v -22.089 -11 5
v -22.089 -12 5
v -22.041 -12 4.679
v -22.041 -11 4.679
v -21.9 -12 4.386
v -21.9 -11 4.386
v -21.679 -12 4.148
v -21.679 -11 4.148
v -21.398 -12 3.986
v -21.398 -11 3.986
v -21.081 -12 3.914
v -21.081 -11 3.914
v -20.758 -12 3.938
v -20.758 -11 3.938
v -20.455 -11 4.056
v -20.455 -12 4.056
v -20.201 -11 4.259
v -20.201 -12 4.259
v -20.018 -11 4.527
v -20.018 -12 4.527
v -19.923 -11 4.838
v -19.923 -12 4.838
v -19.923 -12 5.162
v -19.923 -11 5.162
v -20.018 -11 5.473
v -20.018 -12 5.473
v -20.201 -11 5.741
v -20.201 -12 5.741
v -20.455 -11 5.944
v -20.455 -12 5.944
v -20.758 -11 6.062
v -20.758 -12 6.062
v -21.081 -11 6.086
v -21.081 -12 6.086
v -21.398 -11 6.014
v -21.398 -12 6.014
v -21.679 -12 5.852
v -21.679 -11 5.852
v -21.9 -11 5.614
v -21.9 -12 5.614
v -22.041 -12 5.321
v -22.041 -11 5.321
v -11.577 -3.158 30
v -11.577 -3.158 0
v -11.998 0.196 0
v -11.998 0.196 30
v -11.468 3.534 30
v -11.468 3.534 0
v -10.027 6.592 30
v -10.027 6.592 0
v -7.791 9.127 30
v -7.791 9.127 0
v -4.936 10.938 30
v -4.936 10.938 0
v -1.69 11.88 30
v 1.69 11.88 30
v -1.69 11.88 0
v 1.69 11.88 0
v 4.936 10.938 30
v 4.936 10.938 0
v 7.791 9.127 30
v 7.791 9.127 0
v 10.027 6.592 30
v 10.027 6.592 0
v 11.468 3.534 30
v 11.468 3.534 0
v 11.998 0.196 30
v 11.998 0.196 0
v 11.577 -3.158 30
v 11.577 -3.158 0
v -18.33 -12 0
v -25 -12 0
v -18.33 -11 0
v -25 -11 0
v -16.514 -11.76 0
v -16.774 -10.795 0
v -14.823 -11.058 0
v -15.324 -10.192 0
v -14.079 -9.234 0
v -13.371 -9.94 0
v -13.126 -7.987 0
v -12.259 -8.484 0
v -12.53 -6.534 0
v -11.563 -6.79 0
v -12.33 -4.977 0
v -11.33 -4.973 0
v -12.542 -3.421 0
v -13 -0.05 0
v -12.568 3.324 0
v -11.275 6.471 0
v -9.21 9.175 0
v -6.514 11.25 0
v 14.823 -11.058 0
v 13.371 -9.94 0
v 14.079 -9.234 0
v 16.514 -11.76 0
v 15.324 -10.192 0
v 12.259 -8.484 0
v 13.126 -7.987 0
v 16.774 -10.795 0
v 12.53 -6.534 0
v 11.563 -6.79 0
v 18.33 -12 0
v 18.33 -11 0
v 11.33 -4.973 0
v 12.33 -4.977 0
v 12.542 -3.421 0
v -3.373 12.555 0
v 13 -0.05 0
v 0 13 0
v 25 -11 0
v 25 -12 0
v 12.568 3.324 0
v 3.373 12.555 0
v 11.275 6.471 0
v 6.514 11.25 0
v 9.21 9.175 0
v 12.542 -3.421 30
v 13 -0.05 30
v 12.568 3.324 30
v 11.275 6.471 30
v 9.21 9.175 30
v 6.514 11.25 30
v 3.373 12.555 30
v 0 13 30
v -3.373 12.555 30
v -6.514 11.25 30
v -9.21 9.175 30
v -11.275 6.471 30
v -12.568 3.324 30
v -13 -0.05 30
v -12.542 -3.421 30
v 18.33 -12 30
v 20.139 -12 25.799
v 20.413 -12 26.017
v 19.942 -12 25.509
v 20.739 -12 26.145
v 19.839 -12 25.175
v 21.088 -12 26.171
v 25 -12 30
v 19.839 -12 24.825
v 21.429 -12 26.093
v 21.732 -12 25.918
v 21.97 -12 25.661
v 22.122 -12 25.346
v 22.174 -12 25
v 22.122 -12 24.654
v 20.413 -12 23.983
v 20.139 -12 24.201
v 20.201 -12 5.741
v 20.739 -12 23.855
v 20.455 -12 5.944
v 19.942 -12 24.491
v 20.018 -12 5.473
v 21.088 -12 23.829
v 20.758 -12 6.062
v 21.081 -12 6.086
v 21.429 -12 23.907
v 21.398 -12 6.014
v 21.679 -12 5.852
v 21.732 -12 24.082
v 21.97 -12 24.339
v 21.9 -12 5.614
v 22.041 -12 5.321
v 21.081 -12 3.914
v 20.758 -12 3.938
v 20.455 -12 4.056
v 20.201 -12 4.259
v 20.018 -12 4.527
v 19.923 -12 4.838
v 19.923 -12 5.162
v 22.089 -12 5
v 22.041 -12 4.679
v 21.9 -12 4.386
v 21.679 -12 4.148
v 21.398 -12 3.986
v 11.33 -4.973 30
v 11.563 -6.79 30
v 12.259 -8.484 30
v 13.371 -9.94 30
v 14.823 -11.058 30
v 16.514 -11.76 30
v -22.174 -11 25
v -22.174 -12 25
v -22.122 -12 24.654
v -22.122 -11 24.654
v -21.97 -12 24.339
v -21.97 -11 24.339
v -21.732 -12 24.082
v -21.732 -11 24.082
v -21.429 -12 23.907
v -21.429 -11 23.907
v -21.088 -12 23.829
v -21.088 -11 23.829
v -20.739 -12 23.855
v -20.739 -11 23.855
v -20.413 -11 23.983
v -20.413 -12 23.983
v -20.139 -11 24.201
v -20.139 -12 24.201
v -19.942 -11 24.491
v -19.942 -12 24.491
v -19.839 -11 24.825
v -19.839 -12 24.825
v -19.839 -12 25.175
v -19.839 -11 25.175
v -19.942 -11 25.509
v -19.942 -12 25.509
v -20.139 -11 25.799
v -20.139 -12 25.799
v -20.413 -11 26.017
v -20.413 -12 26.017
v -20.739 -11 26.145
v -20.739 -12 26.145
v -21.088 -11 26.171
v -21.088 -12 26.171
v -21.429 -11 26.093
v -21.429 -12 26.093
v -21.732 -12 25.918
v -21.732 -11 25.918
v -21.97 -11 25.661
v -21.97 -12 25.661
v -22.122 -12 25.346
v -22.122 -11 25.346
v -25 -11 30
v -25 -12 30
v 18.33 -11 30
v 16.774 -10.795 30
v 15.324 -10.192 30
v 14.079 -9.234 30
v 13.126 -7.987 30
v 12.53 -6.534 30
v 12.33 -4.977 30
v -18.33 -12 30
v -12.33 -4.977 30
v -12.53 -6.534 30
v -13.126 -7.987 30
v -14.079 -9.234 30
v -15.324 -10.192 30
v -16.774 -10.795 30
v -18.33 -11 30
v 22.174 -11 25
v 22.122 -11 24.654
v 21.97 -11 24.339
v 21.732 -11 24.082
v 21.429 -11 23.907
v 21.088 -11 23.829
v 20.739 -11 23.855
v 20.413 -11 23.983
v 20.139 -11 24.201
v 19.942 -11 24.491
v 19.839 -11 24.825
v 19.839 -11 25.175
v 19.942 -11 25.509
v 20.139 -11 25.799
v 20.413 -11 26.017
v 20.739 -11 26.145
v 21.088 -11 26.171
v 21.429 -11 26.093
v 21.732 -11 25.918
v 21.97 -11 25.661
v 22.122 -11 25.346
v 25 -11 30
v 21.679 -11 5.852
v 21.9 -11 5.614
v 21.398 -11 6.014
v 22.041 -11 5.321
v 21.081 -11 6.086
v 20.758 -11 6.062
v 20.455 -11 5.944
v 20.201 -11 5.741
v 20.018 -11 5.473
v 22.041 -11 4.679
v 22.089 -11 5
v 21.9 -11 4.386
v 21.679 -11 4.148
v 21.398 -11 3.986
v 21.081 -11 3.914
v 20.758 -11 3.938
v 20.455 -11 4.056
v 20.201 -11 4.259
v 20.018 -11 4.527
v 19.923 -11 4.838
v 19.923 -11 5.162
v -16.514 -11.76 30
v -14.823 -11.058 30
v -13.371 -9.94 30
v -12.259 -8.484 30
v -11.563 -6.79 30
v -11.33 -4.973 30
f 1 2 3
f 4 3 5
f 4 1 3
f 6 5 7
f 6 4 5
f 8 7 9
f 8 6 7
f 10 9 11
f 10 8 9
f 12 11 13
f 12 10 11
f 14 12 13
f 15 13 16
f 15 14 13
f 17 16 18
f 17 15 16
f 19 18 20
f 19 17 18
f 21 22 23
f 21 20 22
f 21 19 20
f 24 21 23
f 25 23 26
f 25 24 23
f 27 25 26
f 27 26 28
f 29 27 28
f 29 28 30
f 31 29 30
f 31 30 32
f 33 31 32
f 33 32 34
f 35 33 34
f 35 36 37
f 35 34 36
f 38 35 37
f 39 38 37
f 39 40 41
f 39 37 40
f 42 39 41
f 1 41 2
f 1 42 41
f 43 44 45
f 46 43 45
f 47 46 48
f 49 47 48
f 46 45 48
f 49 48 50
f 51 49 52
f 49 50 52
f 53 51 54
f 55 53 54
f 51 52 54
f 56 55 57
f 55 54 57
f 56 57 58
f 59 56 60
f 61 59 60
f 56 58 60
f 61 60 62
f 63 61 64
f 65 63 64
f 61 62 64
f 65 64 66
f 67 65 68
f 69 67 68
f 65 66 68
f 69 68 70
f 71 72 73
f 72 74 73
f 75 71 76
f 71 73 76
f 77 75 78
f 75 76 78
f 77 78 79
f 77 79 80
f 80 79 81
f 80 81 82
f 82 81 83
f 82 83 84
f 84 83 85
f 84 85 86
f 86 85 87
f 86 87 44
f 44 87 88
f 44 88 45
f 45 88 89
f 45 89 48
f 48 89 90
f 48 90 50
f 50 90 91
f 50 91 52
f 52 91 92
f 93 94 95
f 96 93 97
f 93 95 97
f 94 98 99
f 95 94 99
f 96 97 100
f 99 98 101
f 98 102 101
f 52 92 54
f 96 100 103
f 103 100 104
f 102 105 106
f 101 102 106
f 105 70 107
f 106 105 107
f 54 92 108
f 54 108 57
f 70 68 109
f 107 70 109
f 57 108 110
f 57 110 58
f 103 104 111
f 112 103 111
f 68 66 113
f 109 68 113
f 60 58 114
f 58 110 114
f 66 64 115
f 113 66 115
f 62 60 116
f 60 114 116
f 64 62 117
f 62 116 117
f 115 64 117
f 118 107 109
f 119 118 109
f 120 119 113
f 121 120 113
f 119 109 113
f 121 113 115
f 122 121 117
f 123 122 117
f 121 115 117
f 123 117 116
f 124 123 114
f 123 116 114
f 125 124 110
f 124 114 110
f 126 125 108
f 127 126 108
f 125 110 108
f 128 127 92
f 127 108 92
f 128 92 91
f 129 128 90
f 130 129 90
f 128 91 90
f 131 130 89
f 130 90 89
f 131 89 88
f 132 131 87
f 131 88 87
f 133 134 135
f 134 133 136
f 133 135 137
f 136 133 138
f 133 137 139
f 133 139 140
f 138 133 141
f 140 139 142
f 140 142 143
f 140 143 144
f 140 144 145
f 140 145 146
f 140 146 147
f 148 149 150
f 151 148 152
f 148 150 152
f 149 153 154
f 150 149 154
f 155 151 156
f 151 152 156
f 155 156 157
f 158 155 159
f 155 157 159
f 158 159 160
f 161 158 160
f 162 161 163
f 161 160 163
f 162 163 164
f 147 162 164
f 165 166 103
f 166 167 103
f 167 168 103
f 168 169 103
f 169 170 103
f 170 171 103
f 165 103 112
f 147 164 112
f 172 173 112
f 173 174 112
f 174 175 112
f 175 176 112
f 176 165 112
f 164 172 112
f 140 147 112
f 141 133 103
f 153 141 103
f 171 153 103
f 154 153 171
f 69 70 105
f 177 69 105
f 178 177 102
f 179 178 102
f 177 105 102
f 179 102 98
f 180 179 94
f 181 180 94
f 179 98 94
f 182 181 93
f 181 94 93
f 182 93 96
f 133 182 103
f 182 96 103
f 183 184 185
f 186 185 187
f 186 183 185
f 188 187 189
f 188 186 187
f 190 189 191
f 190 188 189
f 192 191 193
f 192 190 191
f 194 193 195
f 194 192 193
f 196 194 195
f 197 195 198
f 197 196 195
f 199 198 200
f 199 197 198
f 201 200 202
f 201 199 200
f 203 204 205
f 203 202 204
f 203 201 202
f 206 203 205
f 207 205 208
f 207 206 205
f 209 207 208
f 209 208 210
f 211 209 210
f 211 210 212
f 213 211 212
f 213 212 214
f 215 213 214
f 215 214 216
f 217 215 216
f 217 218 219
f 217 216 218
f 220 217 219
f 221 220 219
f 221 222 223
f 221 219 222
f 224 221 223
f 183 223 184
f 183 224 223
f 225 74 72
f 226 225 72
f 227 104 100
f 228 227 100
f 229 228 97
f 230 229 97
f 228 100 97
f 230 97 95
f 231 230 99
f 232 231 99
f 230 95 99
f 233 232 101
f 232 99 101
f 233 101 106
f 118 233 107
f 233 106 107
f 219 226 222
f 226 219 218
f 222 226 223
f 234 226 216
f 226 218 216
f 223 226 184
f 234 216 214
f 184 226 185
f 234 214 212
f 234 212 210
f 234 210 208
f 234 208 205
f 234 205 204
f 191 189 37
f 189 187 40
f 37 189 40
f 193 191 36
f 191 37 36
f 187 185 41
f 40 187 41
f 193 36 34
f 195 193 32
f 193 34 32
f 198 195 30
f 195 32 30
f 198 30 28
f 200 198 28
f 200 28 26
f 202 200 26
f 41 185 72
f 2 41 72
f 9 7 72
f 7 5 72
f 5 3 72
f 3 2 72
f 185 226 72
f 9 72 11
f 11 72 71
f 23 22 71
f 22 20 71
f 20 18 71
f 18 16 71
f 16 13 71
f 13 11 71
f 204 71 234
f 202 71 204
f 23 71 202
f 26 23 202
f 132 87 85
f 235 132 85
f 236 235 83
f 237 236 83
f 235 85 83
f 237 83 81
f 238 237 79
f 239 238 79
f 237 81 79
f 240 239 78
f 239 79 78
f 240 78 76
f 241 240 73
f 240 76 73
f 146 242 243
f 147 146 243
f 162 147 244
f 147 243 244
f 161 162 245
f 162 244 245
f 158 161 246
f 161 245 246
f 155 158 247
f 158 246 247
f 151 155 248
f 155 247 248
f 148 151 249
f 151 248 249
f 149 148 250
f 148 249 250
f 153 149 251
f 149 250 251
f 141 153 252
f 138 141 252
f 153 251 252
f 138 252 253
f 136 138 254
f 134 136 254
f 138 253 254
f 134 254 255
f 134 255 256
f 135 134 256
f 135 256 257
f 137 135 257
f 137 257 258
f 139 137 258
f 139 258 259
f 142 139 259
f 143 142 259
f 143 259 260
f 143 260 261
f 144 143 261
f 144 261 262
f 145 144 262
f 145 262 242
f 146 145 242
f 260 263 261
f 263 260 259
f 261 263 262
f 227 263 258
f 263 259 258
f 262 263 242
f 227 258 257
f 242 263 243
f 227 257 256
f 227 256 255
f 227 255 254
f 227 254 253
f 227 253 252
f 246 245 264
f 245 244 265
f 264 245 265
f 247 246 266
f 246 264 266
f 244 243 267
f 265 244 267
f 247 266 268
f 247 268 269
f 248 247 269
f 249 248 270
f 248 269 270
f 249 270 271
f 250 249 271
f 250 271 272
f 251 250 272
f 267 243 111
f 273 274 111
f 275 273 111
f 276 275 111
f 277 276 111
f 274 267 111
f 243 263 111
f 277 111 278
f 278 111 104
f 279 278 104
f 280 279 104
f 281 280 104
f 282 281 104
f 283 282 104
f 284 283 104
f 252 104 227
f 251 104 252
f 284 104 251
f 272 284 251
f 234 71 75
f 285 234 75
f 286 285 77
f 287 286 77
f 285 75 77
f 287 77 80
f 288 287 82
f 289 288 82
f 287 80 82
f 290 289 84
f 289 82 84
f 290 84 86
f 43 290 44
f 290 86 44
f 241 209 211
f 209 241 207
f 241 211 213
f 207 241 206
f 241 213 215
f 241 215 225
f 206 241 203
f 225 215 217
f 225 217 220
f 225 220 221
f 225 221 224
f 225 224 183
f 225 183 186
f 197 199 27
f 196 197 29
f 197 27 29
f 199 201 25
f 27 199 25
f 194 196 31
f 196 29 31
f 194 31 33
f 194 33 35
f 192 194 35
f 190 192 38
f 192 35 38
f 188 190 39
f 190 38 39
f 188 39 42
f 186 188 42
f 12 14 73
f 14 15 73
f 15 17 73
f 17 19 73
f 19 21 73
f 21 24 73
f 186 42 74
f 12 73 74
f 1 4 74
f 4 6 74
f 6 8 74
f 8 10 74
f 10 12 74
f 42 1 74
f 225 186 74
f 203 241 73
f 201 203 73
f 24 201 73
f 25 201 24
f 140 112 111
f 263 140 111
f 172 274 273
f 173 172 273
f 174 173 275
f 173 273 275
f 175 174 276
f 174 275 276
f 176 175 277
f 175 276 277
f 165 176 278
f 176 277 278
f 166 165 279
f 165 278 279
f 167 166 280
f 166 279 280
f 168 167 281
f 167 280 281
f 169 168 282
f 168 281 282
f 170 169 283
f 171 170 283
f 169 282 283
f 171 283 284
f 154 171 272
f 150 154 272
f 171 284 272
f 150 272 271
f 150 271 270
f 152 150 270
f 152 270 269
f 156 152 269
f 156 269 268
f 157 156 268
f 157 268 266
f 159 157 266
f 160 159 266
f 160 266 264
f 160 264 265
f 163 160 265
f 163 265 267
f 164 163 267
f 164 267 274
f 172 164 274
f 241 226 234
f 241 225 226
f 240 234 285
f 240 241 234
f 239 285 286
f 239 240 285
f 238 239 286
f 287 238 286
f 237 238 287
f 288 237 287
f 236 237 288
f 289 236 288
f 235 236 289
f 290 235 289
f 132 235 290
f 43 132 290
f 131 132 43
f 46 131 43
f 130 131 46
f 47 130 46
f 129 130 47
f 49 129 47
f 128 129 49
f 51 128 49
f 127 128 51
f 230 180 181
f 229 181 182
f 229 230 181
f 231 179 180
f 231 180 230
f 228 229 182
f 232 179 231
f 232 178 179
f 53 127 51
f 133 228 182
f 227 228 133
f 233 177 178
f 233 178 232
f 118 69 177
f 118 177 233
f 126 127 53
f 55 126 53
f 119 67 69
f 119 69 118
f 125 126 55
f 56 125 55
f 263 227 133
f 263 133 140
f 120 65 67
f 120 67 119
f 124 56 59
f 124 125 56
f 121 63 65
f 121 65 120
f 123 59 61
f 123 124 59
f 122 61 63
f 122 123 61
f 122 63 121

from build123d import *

# Parameters (mm, degrees)
BOSS_EXTRUDE1_DEPTH = 30
SKETCH2_R           = 1.089483659
SKETCH2_R_2         = 1.173994866
CUT_EXTRUDE1_DEPTH  = 15


with BuildPart() as part:
    # Sketch1 → Boss-Extrude1 (new body)
    with BuildSketch(Plane.XY):
        with BuildLine():
            Line((-25, -12), (-18.33030278, -12))
            ThreePointArc((-18.33030278, -12), (-12.76726688, -9.248838851), (-11.577033335, -3.157894737))
            ThreePointArc((-11.577033335, -3.157894737), (0, 12), (11.577033335, -3.157894737))
            ThreePointArc((11.577033335, -3.157894737), (12.76726688, -9.248838851), (18.33030278, -12))
            Line((18.33030278, -12), (25, -12))
            Line((25, -12), (25, -11))
            Line((25, -11), (18.33030278, -11))
            ThreePointArc((18.33030278, -11), (13.561986294, -8.641861872), (12.541786113, -3.421052632))
            ThreePointArc((12.541786113, -3.421052632), (0, 13), (-12.541786113, -3.421052632))
            ThreePointArc((-12.541786113, -3.421052632), (-13.561986294, -8.641861872), (-18.33030278, -11))
            Line((-18.33030278, -11), (-25, -11))
            Line((-25, -11), (-25, -12))
        make_face()
    extrude(amount=BOSS_EXTRUDE1_DEPTH)

    # Sketch2 → Cut-Extrude1 (cut)
    with BuildSketch(Plane(origin=(0, -11, 0), x_dir=(1, 0, 0), z_dir=(0, 1, 0))):
        with Locations((21, -5)):
            Circle(SKETCH2_R)
        with Locations((21, -25)):
            Circle(SKETCH2_R_2)
    cut_extrude1 = extrude(amount=-CUT_EXTRUDE1_DEPTH, mode=Mode.SUBTRACT)

    # Mirror1: Cut-Extrude1 across plane
    add(cut_extrude1.mirror(Plane(origin=(0, 0, 0), x_dir=(0, 0, 1), z_dir=(1, 0, 0))), mode=Mode.SUBTRACT)


solid = part.part
